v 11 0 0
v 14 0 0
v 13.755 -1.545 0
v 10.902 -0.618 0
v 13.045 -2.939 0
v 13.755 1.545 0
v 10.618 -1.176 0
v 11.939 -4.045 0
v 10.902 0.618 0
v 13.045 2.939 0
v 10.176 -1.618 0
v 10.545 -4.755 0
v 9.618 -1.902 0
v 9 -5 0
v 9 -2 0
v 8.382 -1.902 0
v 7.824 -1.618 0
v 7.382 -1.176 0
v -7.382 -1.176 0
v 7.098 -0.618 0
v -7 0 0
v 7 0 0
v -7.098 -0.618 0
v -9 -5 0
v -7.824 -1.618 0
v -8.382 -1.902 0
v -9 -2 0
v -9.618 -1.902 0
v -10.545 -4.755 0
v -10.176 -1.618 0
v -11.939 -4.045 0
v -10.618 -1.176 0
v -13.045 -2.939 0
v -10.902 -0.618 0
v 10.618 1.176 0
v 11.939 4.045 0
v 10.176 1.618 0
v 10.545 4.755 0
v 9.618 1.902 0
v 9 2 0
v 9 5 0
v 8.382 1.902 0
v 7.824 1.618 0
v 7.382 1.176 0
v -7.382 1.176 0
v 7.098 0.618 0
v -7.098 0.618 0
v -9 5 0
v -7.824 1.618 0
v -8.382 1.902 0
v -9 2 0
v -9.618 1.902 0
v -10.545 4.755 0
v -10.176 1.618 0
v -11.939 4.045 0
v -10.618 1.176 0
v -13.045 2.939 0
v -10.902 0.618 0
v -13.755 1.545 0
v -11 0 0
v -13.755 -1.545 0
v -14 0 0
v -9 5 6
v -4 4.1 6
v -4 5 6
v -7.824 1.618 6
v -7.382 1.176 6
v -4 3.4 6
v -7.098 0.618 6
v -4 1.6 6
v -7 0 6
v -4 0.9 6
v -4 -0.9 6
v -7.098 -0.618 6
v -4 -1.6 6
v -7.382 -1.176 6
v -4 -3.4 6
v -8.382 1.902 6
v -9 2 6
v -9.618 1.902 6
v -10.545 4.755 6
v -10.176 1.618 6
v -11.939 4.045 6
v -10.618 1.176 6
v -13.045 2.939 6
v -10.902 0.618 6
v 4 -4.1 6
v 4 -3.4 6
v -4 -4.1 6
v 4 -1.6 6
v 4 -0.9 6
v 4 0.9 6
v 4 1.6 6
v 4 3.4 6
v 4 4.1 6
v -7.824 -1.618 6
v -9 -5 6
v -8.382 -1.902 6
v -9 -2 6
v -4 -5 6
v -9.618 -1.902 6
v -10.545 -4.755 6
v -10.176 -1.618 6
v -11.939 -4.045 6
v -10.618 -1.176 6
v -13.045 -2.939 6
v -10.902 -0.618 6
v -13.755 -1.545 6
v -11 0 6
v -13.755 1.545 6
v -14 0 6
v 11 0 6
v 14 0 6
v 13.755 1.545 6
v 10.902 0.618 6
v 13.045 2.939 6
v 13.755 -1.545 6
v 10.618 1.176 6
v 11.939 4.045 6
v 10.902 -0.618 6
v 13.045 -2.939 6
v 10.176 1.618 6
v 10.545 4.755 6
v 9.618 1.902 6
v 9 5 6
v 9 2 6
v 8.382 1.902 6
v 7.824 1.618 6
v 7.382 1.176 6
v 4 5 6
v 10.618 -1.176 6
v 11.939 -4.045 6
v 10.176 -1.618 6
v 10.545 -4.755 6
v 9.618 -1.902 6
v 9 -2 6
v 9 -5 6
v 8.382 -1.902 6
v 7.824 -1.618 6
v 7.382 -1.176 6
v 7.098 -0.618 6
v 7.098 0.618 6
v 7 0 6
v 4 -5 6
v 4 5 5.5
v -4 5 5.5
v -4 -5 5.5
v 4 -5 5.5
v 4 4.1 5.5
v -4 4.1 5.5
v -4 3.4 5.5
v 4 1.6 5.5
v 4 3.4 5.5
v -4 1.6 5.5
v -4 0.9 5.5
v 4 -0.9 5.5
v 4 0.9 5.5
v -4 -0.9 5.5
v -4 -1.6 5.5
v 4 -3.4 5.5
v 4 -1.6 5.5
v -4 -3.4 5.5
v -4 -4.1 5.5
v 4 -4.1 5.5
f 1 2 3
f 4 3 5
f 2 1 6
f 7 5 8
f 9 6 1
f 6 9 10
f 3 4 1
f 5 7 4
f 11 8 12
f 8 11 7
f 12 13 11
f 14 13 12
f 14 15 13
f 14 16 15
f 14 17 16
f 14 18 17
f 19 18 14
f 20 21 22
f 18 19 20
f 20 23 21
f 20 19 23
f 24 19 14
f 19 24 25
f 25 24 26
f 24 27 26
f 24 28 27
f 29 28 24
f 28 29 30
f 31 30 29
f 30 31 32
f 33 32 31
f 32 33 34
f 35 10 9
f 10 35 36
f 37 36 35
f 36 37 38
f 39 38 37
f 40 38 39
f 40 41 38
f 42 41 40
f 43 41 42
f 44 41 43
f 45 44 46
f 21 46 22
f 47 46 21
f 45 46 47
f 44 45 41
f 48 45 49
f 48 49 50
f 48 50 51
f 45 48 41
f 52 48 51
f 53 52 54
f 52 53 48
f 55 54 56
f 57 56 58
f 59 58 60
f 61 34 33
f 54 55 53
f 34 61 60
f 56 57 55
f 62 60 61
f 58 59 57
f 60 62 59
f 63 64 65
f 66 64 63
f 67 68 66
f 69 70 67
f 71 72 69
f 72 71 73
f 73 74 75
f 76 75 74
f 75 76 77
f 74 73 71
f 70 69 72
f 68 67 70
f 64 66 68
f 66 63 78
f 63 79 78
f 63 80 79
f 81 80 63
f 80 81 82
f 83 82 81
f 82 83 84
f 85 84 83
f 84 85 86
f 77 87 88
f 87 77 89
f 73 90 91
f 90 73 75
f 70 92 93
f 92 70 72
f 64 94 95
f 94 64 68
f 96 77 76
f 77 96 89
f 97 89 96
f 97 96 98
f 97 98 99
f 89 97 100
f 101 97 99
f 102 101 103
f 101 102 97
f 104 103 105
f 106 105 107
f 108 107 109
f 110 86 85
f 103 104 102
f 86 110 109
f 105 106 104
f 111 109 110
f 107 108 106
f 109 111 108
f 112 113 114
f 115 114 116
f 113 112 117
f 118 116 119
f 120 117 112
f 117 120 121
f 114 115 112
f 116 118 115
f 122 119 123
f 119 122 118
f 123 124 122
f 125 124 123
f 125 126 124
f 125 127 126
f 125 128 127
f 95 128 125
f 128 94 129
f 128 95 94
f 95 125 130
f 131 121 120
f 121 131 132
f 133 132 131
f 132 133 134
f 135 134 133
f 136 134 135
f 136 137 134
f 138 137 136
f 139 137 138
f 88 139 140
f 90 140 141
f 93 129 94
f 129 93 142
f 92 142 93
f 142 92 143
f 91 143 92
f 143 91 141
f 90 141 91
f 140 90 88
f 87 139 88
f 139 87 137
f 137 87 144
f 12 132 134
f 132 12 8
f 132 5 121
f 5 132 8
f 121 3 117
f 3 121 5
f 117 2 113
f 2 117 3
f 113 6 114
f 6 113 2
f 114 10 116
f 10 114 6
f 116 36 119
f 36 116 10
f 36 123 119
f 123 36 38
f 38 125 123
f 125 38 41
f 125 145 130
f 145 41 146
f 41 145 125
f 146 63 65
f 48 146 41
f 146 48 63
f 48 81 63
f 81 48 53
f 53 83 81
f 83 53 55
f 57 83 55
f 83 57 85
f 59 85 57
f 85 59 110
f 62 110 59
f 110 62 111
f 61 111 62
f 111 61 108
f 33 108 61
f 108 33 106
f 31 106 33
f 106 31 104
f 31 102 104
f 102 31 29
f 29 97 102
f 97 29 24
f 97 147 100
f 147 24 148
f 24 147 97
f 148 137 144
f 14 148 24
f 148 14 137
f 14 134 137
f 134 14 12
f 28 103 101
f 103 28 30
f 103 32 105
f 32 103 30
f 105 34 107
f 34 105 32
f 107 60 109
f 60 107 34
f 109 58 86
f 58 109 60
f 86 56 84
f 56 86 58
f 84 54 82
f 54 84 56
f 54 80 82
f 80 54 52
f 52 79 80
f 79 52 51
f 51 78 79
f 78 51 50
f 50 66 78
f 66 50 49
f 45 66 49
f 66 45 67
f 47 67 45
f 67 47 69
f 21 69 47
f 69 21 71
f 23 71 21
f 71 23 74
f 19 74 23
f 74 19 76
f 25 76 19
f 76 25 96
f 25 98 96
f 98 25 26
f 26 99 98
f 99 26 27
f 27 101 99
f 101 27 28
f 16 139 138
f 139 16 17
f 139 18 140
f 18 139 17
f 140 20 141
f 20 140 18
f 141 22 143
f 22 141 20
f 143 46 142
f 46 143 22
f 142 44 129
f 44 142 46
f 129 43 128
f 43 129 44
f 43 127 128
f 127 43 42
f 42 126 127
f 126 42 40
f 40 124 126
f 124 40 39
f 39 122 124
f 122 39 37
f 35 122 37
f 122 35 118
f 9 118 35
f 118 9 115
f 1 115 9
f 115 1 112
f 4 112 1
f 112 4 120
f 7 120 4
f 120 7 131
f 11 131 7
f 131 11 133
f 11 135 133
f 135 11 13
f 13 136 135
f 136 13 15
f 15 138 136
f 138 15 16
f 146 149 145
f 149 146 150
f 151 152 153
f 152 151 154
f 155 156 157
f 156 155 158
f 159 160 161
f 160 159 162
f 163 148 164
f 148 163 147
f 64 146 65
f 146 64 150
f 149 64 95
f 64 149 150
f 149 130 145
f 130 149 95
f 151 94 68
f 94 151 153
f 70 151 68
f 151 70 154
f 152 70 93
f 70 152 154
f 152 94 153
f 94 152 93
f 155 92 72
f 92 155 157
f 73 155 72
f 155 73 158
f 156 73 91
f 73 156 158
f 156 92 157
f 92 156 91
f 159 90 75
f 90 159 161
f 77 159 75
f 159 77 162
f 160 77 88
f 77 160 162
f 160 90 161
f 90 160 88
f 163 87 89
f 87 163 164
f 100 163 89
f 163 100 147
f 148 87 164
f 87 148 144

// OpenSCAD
// Reimplementation of Josef Průša's belt clamp
// Adapted for eighter laser cutting or 3d printing.
//
// (c) 2013 Felipe C. da S. Sanches <fsanches@metamaquina.com.br>
// Lincensed under the terms of the GNU General Public License
// version 3 (or later).

//2d shape (good for the lasercutter)
module beltclamp_curves(width, r){
  m4_diameter = 4;
  d = width/2-r;

  difference(){
    hull(){
      for (x=[-d,d]){
        translate([x, 0])
        circle(r=5, $fn=20);
      }
    }

    //These are holes for M3 bolts, but we want
    // some clearance so they'll have 4mm diameter.
    for (x=[-d,d]){
      translate([x, 0])
      circle(r=m4_diameter/2, $fn=20);
    }
  }
}

// This seems to be designed for T5.
//TODO: Adapt this for 2mm GT2? (add a belt_pitch parameter?)
module teeth_for_belt(belt_width=6){
  for (y=[-2:2])
    translate([0,y*2.5])
    square([belt_width+2, 1.8], center = true);
}

module beltclamp(width=28, height=6, r=5, teeth_depth=0.5){
  render()
  difference(){
    linear_extrude(height=height)
    beltclamp_curves(width, r);

    translate([0, 0, height-teeth_depth]){
      linear_extrude(height = teeth_depth+1)
      teeth_for_belt();
    }
  }
}

beltclamp();
